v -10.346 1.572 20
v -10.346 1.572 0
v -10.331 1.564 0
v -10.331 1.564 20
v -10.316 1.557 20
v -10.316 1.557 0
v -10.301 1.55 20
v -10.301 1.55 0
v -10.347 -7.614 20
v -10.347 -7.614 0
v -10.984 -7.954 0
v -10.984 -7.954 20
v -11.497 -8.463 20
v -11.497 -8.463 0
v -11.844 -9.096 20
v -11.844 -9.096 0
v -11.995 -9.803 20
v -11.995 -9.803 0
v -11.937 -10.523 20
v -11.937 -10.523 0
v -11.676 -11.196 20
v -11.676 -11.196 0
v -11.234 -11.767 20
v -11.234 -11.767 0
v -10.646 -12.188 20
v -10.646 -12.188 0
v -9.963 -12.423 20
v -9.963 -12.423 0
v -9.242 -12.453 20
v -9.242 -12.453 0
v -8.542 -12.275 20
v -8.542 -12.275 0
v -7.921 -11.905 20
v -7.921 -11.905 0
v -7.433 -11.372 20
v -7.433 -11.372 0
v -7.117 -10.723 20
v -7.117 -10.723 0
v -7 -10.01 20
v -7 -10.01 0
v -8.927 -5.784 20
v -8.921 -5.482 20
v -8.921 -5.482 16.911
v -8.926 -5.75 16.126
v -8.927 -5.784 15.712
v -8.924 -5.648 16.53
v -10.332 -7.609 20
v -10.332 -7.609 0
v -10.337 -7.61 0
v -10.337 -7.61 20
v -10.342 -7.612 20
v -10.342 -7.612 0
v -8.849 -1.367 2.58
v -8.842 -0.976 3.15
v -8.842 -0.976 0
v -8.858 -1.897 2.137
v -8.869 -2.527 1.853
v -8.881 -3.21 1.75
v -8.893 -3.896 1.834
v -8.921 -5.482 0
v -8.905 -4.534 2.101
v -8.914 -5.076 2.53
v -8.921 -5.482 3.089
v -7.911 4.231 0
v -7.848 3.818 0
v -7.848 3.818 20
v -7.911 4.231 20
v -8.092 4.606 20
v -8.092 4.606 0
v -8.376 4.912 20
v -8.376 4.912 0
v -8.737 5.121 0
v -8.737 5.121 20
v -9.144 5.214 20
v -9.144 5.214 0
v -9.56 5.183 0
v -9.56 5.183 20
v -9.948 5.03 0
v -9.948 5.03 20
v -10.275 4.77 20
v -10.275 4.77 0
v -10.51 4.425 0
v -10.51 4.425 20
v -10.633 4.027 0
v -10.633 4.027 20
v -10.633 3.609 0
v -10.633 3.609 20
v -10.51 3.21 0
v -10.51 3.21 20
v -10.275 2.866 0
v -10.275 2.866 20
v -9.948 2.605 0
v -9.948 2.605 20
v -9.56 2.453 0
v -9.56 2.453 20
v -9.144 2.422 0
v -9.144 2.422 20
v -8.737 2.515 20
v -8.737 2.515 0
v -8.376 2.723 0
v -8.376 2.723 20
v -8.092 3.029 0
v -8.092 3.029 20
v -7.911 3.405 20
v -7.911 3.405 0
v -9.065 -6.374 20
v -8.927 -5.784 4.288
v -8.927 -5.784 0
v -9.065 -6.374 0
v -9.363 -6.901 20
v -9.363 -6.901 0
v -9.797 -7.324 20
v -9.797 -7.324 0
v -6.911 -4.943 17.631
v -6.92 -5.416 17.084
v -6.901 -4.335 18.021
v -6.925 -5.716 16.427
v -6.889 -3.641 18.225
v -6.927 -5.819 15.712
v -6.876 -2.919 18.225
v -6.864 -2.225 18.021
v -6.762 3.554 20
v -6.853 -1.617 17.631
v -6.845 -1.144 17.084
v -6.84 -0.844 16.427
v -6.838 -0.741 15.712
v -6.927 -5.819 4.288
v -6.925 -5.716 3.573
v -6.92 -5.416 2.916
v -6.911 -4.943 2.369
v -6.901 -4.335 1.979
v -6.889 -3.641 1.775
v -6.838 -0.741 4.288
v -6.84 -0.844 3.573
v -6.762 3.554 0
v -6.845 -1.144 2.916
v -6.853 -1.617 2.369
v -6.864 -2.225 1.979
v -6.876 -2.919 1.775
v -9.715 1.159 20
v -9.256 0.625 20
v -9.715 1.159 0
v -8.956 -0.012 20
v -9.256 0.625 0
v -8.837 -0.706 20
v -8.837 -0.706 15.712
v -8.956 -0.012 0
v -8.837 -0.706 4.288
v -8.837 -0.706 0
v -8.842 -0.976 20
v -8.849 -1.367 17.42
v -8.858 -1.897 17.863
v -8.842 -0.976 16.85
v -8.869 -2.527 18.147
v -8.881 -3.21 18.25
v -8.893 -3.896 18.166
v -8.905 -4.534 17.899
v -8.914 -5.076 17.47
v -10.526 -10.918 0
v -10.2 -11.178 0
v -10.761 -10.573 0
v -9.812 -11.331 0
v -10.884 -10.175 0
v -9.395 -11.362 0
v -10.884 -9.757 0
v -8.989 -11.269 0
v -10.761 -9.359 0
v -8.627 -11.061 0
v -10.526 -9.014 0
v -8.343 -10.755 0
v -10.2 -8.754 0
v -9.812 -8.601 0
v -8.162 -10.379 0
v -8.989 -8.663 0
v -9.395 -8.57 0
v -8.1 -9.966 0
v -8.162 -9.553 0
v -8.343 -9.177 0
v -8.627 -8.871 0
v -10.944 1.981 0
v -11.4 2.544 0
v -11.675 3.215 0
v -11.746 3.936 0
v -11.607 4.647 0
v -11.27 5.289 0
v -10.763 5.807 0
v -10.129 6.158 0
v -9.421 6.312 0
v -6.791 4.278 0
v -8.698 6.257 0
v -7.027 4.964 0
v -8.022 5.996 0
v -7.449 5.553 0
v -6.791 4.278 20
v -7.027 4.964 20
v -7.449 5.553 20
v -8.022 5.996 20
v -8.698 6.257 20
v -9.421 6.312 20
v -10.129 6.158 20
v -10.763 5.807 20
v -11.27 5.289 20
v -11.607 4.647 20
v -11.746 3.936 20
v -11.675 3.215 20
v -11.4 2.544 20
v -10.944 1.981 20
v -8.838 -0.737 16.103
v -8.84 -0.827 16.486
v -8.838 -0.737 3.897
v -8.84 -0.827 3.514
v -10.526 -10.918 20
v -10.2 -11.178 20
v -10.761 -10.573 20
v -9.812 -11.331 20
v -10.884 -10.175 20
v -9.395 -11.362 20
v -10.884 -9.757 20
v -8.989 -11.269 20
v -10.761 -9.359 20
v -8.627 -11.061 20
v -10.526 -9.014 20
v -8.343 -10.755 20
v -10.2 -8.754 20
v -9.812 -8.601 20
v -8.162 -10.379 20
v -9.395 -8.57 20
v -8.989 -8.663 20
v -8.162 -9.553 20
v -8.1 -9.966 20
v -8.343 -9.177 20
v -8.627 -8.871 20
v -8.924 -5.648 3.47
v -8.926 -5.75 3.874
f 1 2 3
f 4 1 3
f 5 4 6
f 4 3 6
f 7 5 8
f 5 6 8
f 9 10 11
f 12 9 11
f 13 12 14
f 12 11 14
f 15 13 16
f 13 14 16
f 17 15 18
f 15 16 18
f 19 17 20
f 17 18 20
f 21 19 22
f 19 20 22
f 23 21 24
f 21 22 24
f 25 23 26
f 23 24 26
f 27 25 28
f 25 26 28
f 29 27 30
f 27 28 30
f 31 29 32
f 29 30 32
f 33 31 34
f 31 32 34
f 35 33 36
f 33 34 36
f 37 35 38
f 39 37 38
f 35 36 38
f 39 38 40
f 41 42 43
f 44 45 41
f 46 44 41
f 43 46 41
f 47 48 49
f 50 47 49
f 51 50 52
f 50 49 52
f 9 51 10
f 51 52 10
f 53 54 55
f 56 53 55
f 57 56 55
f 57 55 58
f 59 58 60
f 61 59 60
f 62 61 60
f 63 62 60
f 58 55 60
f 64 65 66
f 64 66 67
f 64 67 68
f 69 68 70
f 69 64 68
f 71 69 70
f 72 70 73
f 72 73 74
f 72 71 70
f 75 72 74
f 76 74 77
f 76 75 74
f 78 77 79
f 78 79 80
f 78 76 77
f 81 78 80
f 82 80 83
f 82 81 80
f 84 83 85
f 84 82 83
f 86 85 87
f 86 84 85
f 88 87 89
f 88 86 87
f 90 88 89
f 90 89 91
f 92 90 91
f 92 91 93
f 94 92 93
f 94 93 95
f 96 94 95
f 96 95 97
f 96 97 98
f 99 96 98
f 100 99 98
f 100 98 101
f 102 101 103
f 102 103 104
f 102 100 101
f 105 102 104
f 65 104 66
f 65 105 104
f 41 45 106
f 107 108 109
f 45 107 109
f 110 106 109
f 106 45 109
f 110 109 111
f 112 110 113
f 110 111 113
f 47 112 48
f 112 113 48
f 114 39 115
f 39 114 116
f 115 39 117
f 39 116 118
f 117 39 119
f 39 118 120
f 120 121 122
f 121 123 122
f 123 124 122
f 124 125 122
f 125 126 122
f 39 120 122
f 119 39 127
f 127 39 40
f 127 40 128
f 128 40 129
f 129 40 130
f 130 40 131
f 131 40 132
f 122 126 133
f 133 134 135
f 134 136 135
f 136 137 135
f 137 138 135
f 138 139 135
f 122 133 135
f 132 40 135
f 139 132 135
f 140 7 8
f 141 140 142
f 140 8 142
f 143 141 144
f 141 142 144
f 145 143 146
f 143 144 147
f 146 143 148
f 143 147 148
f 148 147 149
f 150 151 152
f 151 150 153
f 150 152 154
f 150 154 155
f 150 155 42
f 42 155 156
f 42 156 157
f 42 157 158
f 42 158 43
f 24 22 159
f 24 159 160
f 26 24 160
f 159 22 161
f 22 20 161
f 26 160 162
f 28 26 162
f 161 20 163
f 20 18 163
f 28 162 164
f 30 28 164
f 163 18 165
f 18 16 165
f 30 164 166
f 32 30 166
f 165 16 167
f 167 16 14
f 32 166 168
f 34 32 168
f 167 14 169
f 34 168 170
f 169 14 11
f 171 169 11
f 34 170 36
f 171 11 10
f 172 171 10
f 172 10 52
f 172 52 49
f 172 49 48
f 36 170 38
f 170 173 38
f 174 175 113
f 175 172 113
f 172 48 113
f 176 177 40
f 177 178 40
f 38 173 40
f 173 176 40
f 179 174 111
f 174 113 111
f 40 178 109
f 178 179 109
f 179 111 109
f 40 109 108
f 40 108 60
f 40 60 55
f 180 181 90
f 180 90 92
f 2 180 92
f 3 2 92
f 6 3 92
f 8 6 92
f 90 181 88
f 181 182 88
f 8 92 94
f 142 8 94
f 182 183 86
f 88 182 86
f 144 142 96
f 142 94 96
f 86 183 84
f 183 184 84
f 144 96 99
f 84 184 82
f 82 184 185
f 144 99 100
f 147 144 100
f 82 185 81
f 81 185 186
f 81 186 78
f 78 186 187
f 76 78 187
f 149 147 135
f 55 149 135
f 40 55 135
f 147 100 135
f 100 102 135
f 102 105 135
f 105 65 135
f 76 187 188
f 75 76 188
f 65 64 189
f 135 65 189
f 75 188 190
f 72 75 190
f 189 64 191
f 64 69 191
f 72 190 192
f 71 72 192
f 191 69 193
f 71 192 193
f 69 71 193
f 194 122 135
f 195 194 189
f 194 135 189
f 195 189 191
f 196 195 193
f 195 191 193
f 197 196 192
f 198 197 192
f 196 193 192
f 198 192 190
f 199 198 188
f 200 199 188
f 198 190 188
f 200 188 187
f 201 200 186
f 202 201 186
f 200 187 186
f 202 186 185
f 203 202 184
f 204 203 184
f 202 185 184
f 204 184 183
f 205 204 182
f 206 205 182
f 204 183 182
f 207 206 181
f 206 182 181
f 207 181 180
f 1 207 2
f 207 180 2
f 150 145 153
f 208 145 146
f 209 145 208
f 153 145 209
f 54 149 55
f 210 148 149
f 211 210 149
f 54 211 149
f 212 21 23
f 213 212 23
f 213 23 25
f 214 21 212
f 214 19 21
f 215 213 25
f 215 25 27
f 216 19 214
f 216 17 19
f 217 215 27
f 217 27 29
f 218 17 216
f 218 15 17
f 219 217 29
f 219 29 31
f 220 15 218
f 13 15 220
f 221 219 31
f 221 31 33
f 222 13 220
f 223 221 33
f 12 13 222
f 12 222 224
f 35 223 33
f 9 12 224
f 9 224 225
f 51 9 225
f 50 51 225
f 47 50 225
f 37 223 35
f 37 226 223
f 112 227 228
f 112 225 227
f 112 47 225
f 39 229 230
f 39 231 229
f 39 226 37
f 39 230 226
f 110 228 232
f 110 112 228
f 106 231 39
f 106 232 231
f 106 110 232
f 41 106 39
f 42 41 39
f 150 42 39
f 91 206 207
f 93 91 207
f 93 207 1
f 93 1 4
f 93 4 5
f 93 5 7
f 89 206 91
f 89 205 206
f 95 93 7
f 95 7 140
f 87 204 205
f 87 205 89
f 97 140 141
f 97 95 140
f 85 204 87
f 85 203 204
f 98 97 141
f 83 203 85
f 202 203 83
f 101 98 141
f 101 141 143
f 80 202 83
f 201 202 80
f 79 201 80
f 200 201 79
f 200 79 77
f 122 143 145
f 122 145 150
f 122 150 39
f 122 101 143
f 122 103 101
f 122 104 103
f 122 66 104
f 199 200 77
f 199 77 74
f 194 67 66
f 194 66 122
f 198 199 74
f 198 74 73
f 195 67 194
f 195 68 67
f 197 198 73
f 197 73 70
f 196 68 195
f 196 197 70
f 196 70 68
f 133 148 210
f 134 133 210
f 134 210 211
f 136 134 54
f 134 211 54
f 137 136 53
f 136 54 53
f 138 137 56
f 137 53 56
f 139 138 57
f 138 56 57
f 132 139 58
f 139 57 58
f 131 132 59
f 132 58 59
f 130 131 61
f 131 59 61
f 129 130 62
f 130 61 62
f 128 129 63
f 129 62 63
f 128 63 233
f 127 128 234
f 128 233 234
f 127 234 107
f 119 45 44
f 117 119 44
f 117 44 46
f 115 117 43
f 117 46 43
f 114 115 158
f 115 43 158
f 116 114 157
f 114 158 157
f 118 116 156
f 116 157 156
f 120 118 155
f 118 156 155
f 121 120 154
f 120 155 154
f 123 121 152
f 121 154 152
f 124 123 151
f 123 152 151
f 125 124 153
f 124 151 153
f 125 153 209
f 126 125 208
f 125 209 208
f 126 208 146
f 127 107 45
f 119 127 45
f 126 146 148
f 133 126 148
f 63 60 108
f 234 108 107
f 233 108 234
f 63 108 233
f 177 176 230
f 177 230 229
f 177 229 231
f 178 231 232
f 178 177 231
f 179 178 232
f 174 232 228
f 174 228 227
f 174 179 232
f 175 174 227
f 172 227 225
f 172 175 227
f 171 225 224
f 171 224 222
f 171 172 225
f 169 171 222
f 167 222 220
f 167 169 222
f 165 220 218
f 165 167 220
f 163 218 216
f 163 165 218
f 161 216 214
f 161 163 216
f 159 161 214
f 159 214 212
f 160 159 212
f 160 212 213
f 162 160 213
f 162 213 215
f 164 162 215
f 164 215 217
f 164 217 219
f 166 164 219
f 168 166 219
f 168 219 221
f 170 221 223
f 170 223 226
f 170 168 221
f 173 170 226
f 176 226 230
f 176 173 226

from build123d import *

# Parameters (mm, degrees)
F0_R     = 1.4
F1_DEPTH = 20
F3_DEPTH = 25


with BuildPart() as f1:
    # F0 (on Top) → F1 (new body)
    with BuildSketch(Plane.XY):
        with BuildLine():
            Line((-7.0003855483, -10.0099180601), (-6.7623309092, 3.5543028464))
            ThreePointArc((-6.7623309092, 3.5543028464), (-10.4585665785, 6.0054288438), (-10.3461336795, 1.5717468952))
            ThreePointArc((-10.3461336795, 1.5717468952), (-10.3233728773, 1.5610396555), (-10.3007163302, 1.5501135413))
            ThreePointArc((-10.3007163302, 1.5501135413), (-9.2560773016, 0.6249853883), (-8.8374101803, -0.706123413))
            ThreePointArc((-8.8374101803, -0.706123413), (-8.8362952804, -0.8408801673), (-8.8421380502, -0.9755148131))
            Line((-8.8421380502, -0.9755148131), (-8.9212343032, -5.4823753058))
            ThreePointArc((-8.9212343032, -5.4823753058), (-8.9185680619, -5.6331193754), (-8.9265222058, -5.7836770552))
            ThreePointArc((-8.9265222058, -5.7836770552), (-9.3628437334, -6.9014074118), (-10.3321539521, -7.6086098761))
            ThreePointArc((-10.3321539521, -7.6086098761), (-10.33956522, -7.6112390978), (-10.3469681809, -7.6138916189))
            ThreePointArc((-10.3469681809, -7.6138916189), (-10.9553516609, -11.9987700238), (-7.0003855483, -10.0099180601))
        make_face()
        with Locations((-9.5000006258, -9.9660493433)):
            Circle(F0_R, mode=Mode.SUBTRACT)
        with Locations((-9.248400609, 3.8178506564)):
            Circle(F0_R, mode=Mode.SUBTRACT)
        with BuildLine():
            ThreePointArc((-10.3007163302, 1.5501135413), (-10.3233728773, 1.5610396555), (-10.3461336795, 1.5717468952))
            ThreePointArc((-10.3461336795, 1.5717468952), (-10.323479421, 1.5608159761), (-10.3007163302, 1.5501135413))
        make_face()
        with BuildLine():
            ThreePointArc((-8.8421380502, -0.9755148131), (-8.8362952804, -0.8408801673), (-8.8374101803, -0.706123413))
            Line((-8.8374101803, -0.706123413), (-8.8421380502, -0.9755148131))
        make_face()
        with BuildLine():
            Line((-8.9212343032, -5.4823753058), (-8.9265222058, -5.7836770552))
            ThreePointArc((-8.9265222058, -5.7836770552), (-8.9185680619, -5.6331193754), (-8.9212343032, -5.4823753058))
        make_face()
    extrude(amount=F1_DEPTH)

    # F2 (on face) → F3 (cut)
    with BuildSketch(Plane(origin=(-8.822300232, 0.1548330356, 0), x_dir=(-0.0175474867, -0.999846031, 0), z_dir=(-0.999846031, 0.0175474867, 0))):
        with BuildLine():
            Line((5.939424578, 4.2884354293), (5.939424578, 15.7115645707))
            ThreePointArc((5.939424578, 15.7115645707), (3.4002568038, 18.2507323449), (0.8610890296, 15.7115645707))
            Line((0.8610890296, 15.7115645707), (0.8610890296, 4.2884354293))
            ThreePointArc((0.8610890296, 4.2884354293), (3.4002568038, 1.7492676551), (5.939424578, 4.2884354293))
        make_face()
    extrude(amount=-F3_DEPTH, mode=Mode.SUBTRACT)


solid = f1.part
